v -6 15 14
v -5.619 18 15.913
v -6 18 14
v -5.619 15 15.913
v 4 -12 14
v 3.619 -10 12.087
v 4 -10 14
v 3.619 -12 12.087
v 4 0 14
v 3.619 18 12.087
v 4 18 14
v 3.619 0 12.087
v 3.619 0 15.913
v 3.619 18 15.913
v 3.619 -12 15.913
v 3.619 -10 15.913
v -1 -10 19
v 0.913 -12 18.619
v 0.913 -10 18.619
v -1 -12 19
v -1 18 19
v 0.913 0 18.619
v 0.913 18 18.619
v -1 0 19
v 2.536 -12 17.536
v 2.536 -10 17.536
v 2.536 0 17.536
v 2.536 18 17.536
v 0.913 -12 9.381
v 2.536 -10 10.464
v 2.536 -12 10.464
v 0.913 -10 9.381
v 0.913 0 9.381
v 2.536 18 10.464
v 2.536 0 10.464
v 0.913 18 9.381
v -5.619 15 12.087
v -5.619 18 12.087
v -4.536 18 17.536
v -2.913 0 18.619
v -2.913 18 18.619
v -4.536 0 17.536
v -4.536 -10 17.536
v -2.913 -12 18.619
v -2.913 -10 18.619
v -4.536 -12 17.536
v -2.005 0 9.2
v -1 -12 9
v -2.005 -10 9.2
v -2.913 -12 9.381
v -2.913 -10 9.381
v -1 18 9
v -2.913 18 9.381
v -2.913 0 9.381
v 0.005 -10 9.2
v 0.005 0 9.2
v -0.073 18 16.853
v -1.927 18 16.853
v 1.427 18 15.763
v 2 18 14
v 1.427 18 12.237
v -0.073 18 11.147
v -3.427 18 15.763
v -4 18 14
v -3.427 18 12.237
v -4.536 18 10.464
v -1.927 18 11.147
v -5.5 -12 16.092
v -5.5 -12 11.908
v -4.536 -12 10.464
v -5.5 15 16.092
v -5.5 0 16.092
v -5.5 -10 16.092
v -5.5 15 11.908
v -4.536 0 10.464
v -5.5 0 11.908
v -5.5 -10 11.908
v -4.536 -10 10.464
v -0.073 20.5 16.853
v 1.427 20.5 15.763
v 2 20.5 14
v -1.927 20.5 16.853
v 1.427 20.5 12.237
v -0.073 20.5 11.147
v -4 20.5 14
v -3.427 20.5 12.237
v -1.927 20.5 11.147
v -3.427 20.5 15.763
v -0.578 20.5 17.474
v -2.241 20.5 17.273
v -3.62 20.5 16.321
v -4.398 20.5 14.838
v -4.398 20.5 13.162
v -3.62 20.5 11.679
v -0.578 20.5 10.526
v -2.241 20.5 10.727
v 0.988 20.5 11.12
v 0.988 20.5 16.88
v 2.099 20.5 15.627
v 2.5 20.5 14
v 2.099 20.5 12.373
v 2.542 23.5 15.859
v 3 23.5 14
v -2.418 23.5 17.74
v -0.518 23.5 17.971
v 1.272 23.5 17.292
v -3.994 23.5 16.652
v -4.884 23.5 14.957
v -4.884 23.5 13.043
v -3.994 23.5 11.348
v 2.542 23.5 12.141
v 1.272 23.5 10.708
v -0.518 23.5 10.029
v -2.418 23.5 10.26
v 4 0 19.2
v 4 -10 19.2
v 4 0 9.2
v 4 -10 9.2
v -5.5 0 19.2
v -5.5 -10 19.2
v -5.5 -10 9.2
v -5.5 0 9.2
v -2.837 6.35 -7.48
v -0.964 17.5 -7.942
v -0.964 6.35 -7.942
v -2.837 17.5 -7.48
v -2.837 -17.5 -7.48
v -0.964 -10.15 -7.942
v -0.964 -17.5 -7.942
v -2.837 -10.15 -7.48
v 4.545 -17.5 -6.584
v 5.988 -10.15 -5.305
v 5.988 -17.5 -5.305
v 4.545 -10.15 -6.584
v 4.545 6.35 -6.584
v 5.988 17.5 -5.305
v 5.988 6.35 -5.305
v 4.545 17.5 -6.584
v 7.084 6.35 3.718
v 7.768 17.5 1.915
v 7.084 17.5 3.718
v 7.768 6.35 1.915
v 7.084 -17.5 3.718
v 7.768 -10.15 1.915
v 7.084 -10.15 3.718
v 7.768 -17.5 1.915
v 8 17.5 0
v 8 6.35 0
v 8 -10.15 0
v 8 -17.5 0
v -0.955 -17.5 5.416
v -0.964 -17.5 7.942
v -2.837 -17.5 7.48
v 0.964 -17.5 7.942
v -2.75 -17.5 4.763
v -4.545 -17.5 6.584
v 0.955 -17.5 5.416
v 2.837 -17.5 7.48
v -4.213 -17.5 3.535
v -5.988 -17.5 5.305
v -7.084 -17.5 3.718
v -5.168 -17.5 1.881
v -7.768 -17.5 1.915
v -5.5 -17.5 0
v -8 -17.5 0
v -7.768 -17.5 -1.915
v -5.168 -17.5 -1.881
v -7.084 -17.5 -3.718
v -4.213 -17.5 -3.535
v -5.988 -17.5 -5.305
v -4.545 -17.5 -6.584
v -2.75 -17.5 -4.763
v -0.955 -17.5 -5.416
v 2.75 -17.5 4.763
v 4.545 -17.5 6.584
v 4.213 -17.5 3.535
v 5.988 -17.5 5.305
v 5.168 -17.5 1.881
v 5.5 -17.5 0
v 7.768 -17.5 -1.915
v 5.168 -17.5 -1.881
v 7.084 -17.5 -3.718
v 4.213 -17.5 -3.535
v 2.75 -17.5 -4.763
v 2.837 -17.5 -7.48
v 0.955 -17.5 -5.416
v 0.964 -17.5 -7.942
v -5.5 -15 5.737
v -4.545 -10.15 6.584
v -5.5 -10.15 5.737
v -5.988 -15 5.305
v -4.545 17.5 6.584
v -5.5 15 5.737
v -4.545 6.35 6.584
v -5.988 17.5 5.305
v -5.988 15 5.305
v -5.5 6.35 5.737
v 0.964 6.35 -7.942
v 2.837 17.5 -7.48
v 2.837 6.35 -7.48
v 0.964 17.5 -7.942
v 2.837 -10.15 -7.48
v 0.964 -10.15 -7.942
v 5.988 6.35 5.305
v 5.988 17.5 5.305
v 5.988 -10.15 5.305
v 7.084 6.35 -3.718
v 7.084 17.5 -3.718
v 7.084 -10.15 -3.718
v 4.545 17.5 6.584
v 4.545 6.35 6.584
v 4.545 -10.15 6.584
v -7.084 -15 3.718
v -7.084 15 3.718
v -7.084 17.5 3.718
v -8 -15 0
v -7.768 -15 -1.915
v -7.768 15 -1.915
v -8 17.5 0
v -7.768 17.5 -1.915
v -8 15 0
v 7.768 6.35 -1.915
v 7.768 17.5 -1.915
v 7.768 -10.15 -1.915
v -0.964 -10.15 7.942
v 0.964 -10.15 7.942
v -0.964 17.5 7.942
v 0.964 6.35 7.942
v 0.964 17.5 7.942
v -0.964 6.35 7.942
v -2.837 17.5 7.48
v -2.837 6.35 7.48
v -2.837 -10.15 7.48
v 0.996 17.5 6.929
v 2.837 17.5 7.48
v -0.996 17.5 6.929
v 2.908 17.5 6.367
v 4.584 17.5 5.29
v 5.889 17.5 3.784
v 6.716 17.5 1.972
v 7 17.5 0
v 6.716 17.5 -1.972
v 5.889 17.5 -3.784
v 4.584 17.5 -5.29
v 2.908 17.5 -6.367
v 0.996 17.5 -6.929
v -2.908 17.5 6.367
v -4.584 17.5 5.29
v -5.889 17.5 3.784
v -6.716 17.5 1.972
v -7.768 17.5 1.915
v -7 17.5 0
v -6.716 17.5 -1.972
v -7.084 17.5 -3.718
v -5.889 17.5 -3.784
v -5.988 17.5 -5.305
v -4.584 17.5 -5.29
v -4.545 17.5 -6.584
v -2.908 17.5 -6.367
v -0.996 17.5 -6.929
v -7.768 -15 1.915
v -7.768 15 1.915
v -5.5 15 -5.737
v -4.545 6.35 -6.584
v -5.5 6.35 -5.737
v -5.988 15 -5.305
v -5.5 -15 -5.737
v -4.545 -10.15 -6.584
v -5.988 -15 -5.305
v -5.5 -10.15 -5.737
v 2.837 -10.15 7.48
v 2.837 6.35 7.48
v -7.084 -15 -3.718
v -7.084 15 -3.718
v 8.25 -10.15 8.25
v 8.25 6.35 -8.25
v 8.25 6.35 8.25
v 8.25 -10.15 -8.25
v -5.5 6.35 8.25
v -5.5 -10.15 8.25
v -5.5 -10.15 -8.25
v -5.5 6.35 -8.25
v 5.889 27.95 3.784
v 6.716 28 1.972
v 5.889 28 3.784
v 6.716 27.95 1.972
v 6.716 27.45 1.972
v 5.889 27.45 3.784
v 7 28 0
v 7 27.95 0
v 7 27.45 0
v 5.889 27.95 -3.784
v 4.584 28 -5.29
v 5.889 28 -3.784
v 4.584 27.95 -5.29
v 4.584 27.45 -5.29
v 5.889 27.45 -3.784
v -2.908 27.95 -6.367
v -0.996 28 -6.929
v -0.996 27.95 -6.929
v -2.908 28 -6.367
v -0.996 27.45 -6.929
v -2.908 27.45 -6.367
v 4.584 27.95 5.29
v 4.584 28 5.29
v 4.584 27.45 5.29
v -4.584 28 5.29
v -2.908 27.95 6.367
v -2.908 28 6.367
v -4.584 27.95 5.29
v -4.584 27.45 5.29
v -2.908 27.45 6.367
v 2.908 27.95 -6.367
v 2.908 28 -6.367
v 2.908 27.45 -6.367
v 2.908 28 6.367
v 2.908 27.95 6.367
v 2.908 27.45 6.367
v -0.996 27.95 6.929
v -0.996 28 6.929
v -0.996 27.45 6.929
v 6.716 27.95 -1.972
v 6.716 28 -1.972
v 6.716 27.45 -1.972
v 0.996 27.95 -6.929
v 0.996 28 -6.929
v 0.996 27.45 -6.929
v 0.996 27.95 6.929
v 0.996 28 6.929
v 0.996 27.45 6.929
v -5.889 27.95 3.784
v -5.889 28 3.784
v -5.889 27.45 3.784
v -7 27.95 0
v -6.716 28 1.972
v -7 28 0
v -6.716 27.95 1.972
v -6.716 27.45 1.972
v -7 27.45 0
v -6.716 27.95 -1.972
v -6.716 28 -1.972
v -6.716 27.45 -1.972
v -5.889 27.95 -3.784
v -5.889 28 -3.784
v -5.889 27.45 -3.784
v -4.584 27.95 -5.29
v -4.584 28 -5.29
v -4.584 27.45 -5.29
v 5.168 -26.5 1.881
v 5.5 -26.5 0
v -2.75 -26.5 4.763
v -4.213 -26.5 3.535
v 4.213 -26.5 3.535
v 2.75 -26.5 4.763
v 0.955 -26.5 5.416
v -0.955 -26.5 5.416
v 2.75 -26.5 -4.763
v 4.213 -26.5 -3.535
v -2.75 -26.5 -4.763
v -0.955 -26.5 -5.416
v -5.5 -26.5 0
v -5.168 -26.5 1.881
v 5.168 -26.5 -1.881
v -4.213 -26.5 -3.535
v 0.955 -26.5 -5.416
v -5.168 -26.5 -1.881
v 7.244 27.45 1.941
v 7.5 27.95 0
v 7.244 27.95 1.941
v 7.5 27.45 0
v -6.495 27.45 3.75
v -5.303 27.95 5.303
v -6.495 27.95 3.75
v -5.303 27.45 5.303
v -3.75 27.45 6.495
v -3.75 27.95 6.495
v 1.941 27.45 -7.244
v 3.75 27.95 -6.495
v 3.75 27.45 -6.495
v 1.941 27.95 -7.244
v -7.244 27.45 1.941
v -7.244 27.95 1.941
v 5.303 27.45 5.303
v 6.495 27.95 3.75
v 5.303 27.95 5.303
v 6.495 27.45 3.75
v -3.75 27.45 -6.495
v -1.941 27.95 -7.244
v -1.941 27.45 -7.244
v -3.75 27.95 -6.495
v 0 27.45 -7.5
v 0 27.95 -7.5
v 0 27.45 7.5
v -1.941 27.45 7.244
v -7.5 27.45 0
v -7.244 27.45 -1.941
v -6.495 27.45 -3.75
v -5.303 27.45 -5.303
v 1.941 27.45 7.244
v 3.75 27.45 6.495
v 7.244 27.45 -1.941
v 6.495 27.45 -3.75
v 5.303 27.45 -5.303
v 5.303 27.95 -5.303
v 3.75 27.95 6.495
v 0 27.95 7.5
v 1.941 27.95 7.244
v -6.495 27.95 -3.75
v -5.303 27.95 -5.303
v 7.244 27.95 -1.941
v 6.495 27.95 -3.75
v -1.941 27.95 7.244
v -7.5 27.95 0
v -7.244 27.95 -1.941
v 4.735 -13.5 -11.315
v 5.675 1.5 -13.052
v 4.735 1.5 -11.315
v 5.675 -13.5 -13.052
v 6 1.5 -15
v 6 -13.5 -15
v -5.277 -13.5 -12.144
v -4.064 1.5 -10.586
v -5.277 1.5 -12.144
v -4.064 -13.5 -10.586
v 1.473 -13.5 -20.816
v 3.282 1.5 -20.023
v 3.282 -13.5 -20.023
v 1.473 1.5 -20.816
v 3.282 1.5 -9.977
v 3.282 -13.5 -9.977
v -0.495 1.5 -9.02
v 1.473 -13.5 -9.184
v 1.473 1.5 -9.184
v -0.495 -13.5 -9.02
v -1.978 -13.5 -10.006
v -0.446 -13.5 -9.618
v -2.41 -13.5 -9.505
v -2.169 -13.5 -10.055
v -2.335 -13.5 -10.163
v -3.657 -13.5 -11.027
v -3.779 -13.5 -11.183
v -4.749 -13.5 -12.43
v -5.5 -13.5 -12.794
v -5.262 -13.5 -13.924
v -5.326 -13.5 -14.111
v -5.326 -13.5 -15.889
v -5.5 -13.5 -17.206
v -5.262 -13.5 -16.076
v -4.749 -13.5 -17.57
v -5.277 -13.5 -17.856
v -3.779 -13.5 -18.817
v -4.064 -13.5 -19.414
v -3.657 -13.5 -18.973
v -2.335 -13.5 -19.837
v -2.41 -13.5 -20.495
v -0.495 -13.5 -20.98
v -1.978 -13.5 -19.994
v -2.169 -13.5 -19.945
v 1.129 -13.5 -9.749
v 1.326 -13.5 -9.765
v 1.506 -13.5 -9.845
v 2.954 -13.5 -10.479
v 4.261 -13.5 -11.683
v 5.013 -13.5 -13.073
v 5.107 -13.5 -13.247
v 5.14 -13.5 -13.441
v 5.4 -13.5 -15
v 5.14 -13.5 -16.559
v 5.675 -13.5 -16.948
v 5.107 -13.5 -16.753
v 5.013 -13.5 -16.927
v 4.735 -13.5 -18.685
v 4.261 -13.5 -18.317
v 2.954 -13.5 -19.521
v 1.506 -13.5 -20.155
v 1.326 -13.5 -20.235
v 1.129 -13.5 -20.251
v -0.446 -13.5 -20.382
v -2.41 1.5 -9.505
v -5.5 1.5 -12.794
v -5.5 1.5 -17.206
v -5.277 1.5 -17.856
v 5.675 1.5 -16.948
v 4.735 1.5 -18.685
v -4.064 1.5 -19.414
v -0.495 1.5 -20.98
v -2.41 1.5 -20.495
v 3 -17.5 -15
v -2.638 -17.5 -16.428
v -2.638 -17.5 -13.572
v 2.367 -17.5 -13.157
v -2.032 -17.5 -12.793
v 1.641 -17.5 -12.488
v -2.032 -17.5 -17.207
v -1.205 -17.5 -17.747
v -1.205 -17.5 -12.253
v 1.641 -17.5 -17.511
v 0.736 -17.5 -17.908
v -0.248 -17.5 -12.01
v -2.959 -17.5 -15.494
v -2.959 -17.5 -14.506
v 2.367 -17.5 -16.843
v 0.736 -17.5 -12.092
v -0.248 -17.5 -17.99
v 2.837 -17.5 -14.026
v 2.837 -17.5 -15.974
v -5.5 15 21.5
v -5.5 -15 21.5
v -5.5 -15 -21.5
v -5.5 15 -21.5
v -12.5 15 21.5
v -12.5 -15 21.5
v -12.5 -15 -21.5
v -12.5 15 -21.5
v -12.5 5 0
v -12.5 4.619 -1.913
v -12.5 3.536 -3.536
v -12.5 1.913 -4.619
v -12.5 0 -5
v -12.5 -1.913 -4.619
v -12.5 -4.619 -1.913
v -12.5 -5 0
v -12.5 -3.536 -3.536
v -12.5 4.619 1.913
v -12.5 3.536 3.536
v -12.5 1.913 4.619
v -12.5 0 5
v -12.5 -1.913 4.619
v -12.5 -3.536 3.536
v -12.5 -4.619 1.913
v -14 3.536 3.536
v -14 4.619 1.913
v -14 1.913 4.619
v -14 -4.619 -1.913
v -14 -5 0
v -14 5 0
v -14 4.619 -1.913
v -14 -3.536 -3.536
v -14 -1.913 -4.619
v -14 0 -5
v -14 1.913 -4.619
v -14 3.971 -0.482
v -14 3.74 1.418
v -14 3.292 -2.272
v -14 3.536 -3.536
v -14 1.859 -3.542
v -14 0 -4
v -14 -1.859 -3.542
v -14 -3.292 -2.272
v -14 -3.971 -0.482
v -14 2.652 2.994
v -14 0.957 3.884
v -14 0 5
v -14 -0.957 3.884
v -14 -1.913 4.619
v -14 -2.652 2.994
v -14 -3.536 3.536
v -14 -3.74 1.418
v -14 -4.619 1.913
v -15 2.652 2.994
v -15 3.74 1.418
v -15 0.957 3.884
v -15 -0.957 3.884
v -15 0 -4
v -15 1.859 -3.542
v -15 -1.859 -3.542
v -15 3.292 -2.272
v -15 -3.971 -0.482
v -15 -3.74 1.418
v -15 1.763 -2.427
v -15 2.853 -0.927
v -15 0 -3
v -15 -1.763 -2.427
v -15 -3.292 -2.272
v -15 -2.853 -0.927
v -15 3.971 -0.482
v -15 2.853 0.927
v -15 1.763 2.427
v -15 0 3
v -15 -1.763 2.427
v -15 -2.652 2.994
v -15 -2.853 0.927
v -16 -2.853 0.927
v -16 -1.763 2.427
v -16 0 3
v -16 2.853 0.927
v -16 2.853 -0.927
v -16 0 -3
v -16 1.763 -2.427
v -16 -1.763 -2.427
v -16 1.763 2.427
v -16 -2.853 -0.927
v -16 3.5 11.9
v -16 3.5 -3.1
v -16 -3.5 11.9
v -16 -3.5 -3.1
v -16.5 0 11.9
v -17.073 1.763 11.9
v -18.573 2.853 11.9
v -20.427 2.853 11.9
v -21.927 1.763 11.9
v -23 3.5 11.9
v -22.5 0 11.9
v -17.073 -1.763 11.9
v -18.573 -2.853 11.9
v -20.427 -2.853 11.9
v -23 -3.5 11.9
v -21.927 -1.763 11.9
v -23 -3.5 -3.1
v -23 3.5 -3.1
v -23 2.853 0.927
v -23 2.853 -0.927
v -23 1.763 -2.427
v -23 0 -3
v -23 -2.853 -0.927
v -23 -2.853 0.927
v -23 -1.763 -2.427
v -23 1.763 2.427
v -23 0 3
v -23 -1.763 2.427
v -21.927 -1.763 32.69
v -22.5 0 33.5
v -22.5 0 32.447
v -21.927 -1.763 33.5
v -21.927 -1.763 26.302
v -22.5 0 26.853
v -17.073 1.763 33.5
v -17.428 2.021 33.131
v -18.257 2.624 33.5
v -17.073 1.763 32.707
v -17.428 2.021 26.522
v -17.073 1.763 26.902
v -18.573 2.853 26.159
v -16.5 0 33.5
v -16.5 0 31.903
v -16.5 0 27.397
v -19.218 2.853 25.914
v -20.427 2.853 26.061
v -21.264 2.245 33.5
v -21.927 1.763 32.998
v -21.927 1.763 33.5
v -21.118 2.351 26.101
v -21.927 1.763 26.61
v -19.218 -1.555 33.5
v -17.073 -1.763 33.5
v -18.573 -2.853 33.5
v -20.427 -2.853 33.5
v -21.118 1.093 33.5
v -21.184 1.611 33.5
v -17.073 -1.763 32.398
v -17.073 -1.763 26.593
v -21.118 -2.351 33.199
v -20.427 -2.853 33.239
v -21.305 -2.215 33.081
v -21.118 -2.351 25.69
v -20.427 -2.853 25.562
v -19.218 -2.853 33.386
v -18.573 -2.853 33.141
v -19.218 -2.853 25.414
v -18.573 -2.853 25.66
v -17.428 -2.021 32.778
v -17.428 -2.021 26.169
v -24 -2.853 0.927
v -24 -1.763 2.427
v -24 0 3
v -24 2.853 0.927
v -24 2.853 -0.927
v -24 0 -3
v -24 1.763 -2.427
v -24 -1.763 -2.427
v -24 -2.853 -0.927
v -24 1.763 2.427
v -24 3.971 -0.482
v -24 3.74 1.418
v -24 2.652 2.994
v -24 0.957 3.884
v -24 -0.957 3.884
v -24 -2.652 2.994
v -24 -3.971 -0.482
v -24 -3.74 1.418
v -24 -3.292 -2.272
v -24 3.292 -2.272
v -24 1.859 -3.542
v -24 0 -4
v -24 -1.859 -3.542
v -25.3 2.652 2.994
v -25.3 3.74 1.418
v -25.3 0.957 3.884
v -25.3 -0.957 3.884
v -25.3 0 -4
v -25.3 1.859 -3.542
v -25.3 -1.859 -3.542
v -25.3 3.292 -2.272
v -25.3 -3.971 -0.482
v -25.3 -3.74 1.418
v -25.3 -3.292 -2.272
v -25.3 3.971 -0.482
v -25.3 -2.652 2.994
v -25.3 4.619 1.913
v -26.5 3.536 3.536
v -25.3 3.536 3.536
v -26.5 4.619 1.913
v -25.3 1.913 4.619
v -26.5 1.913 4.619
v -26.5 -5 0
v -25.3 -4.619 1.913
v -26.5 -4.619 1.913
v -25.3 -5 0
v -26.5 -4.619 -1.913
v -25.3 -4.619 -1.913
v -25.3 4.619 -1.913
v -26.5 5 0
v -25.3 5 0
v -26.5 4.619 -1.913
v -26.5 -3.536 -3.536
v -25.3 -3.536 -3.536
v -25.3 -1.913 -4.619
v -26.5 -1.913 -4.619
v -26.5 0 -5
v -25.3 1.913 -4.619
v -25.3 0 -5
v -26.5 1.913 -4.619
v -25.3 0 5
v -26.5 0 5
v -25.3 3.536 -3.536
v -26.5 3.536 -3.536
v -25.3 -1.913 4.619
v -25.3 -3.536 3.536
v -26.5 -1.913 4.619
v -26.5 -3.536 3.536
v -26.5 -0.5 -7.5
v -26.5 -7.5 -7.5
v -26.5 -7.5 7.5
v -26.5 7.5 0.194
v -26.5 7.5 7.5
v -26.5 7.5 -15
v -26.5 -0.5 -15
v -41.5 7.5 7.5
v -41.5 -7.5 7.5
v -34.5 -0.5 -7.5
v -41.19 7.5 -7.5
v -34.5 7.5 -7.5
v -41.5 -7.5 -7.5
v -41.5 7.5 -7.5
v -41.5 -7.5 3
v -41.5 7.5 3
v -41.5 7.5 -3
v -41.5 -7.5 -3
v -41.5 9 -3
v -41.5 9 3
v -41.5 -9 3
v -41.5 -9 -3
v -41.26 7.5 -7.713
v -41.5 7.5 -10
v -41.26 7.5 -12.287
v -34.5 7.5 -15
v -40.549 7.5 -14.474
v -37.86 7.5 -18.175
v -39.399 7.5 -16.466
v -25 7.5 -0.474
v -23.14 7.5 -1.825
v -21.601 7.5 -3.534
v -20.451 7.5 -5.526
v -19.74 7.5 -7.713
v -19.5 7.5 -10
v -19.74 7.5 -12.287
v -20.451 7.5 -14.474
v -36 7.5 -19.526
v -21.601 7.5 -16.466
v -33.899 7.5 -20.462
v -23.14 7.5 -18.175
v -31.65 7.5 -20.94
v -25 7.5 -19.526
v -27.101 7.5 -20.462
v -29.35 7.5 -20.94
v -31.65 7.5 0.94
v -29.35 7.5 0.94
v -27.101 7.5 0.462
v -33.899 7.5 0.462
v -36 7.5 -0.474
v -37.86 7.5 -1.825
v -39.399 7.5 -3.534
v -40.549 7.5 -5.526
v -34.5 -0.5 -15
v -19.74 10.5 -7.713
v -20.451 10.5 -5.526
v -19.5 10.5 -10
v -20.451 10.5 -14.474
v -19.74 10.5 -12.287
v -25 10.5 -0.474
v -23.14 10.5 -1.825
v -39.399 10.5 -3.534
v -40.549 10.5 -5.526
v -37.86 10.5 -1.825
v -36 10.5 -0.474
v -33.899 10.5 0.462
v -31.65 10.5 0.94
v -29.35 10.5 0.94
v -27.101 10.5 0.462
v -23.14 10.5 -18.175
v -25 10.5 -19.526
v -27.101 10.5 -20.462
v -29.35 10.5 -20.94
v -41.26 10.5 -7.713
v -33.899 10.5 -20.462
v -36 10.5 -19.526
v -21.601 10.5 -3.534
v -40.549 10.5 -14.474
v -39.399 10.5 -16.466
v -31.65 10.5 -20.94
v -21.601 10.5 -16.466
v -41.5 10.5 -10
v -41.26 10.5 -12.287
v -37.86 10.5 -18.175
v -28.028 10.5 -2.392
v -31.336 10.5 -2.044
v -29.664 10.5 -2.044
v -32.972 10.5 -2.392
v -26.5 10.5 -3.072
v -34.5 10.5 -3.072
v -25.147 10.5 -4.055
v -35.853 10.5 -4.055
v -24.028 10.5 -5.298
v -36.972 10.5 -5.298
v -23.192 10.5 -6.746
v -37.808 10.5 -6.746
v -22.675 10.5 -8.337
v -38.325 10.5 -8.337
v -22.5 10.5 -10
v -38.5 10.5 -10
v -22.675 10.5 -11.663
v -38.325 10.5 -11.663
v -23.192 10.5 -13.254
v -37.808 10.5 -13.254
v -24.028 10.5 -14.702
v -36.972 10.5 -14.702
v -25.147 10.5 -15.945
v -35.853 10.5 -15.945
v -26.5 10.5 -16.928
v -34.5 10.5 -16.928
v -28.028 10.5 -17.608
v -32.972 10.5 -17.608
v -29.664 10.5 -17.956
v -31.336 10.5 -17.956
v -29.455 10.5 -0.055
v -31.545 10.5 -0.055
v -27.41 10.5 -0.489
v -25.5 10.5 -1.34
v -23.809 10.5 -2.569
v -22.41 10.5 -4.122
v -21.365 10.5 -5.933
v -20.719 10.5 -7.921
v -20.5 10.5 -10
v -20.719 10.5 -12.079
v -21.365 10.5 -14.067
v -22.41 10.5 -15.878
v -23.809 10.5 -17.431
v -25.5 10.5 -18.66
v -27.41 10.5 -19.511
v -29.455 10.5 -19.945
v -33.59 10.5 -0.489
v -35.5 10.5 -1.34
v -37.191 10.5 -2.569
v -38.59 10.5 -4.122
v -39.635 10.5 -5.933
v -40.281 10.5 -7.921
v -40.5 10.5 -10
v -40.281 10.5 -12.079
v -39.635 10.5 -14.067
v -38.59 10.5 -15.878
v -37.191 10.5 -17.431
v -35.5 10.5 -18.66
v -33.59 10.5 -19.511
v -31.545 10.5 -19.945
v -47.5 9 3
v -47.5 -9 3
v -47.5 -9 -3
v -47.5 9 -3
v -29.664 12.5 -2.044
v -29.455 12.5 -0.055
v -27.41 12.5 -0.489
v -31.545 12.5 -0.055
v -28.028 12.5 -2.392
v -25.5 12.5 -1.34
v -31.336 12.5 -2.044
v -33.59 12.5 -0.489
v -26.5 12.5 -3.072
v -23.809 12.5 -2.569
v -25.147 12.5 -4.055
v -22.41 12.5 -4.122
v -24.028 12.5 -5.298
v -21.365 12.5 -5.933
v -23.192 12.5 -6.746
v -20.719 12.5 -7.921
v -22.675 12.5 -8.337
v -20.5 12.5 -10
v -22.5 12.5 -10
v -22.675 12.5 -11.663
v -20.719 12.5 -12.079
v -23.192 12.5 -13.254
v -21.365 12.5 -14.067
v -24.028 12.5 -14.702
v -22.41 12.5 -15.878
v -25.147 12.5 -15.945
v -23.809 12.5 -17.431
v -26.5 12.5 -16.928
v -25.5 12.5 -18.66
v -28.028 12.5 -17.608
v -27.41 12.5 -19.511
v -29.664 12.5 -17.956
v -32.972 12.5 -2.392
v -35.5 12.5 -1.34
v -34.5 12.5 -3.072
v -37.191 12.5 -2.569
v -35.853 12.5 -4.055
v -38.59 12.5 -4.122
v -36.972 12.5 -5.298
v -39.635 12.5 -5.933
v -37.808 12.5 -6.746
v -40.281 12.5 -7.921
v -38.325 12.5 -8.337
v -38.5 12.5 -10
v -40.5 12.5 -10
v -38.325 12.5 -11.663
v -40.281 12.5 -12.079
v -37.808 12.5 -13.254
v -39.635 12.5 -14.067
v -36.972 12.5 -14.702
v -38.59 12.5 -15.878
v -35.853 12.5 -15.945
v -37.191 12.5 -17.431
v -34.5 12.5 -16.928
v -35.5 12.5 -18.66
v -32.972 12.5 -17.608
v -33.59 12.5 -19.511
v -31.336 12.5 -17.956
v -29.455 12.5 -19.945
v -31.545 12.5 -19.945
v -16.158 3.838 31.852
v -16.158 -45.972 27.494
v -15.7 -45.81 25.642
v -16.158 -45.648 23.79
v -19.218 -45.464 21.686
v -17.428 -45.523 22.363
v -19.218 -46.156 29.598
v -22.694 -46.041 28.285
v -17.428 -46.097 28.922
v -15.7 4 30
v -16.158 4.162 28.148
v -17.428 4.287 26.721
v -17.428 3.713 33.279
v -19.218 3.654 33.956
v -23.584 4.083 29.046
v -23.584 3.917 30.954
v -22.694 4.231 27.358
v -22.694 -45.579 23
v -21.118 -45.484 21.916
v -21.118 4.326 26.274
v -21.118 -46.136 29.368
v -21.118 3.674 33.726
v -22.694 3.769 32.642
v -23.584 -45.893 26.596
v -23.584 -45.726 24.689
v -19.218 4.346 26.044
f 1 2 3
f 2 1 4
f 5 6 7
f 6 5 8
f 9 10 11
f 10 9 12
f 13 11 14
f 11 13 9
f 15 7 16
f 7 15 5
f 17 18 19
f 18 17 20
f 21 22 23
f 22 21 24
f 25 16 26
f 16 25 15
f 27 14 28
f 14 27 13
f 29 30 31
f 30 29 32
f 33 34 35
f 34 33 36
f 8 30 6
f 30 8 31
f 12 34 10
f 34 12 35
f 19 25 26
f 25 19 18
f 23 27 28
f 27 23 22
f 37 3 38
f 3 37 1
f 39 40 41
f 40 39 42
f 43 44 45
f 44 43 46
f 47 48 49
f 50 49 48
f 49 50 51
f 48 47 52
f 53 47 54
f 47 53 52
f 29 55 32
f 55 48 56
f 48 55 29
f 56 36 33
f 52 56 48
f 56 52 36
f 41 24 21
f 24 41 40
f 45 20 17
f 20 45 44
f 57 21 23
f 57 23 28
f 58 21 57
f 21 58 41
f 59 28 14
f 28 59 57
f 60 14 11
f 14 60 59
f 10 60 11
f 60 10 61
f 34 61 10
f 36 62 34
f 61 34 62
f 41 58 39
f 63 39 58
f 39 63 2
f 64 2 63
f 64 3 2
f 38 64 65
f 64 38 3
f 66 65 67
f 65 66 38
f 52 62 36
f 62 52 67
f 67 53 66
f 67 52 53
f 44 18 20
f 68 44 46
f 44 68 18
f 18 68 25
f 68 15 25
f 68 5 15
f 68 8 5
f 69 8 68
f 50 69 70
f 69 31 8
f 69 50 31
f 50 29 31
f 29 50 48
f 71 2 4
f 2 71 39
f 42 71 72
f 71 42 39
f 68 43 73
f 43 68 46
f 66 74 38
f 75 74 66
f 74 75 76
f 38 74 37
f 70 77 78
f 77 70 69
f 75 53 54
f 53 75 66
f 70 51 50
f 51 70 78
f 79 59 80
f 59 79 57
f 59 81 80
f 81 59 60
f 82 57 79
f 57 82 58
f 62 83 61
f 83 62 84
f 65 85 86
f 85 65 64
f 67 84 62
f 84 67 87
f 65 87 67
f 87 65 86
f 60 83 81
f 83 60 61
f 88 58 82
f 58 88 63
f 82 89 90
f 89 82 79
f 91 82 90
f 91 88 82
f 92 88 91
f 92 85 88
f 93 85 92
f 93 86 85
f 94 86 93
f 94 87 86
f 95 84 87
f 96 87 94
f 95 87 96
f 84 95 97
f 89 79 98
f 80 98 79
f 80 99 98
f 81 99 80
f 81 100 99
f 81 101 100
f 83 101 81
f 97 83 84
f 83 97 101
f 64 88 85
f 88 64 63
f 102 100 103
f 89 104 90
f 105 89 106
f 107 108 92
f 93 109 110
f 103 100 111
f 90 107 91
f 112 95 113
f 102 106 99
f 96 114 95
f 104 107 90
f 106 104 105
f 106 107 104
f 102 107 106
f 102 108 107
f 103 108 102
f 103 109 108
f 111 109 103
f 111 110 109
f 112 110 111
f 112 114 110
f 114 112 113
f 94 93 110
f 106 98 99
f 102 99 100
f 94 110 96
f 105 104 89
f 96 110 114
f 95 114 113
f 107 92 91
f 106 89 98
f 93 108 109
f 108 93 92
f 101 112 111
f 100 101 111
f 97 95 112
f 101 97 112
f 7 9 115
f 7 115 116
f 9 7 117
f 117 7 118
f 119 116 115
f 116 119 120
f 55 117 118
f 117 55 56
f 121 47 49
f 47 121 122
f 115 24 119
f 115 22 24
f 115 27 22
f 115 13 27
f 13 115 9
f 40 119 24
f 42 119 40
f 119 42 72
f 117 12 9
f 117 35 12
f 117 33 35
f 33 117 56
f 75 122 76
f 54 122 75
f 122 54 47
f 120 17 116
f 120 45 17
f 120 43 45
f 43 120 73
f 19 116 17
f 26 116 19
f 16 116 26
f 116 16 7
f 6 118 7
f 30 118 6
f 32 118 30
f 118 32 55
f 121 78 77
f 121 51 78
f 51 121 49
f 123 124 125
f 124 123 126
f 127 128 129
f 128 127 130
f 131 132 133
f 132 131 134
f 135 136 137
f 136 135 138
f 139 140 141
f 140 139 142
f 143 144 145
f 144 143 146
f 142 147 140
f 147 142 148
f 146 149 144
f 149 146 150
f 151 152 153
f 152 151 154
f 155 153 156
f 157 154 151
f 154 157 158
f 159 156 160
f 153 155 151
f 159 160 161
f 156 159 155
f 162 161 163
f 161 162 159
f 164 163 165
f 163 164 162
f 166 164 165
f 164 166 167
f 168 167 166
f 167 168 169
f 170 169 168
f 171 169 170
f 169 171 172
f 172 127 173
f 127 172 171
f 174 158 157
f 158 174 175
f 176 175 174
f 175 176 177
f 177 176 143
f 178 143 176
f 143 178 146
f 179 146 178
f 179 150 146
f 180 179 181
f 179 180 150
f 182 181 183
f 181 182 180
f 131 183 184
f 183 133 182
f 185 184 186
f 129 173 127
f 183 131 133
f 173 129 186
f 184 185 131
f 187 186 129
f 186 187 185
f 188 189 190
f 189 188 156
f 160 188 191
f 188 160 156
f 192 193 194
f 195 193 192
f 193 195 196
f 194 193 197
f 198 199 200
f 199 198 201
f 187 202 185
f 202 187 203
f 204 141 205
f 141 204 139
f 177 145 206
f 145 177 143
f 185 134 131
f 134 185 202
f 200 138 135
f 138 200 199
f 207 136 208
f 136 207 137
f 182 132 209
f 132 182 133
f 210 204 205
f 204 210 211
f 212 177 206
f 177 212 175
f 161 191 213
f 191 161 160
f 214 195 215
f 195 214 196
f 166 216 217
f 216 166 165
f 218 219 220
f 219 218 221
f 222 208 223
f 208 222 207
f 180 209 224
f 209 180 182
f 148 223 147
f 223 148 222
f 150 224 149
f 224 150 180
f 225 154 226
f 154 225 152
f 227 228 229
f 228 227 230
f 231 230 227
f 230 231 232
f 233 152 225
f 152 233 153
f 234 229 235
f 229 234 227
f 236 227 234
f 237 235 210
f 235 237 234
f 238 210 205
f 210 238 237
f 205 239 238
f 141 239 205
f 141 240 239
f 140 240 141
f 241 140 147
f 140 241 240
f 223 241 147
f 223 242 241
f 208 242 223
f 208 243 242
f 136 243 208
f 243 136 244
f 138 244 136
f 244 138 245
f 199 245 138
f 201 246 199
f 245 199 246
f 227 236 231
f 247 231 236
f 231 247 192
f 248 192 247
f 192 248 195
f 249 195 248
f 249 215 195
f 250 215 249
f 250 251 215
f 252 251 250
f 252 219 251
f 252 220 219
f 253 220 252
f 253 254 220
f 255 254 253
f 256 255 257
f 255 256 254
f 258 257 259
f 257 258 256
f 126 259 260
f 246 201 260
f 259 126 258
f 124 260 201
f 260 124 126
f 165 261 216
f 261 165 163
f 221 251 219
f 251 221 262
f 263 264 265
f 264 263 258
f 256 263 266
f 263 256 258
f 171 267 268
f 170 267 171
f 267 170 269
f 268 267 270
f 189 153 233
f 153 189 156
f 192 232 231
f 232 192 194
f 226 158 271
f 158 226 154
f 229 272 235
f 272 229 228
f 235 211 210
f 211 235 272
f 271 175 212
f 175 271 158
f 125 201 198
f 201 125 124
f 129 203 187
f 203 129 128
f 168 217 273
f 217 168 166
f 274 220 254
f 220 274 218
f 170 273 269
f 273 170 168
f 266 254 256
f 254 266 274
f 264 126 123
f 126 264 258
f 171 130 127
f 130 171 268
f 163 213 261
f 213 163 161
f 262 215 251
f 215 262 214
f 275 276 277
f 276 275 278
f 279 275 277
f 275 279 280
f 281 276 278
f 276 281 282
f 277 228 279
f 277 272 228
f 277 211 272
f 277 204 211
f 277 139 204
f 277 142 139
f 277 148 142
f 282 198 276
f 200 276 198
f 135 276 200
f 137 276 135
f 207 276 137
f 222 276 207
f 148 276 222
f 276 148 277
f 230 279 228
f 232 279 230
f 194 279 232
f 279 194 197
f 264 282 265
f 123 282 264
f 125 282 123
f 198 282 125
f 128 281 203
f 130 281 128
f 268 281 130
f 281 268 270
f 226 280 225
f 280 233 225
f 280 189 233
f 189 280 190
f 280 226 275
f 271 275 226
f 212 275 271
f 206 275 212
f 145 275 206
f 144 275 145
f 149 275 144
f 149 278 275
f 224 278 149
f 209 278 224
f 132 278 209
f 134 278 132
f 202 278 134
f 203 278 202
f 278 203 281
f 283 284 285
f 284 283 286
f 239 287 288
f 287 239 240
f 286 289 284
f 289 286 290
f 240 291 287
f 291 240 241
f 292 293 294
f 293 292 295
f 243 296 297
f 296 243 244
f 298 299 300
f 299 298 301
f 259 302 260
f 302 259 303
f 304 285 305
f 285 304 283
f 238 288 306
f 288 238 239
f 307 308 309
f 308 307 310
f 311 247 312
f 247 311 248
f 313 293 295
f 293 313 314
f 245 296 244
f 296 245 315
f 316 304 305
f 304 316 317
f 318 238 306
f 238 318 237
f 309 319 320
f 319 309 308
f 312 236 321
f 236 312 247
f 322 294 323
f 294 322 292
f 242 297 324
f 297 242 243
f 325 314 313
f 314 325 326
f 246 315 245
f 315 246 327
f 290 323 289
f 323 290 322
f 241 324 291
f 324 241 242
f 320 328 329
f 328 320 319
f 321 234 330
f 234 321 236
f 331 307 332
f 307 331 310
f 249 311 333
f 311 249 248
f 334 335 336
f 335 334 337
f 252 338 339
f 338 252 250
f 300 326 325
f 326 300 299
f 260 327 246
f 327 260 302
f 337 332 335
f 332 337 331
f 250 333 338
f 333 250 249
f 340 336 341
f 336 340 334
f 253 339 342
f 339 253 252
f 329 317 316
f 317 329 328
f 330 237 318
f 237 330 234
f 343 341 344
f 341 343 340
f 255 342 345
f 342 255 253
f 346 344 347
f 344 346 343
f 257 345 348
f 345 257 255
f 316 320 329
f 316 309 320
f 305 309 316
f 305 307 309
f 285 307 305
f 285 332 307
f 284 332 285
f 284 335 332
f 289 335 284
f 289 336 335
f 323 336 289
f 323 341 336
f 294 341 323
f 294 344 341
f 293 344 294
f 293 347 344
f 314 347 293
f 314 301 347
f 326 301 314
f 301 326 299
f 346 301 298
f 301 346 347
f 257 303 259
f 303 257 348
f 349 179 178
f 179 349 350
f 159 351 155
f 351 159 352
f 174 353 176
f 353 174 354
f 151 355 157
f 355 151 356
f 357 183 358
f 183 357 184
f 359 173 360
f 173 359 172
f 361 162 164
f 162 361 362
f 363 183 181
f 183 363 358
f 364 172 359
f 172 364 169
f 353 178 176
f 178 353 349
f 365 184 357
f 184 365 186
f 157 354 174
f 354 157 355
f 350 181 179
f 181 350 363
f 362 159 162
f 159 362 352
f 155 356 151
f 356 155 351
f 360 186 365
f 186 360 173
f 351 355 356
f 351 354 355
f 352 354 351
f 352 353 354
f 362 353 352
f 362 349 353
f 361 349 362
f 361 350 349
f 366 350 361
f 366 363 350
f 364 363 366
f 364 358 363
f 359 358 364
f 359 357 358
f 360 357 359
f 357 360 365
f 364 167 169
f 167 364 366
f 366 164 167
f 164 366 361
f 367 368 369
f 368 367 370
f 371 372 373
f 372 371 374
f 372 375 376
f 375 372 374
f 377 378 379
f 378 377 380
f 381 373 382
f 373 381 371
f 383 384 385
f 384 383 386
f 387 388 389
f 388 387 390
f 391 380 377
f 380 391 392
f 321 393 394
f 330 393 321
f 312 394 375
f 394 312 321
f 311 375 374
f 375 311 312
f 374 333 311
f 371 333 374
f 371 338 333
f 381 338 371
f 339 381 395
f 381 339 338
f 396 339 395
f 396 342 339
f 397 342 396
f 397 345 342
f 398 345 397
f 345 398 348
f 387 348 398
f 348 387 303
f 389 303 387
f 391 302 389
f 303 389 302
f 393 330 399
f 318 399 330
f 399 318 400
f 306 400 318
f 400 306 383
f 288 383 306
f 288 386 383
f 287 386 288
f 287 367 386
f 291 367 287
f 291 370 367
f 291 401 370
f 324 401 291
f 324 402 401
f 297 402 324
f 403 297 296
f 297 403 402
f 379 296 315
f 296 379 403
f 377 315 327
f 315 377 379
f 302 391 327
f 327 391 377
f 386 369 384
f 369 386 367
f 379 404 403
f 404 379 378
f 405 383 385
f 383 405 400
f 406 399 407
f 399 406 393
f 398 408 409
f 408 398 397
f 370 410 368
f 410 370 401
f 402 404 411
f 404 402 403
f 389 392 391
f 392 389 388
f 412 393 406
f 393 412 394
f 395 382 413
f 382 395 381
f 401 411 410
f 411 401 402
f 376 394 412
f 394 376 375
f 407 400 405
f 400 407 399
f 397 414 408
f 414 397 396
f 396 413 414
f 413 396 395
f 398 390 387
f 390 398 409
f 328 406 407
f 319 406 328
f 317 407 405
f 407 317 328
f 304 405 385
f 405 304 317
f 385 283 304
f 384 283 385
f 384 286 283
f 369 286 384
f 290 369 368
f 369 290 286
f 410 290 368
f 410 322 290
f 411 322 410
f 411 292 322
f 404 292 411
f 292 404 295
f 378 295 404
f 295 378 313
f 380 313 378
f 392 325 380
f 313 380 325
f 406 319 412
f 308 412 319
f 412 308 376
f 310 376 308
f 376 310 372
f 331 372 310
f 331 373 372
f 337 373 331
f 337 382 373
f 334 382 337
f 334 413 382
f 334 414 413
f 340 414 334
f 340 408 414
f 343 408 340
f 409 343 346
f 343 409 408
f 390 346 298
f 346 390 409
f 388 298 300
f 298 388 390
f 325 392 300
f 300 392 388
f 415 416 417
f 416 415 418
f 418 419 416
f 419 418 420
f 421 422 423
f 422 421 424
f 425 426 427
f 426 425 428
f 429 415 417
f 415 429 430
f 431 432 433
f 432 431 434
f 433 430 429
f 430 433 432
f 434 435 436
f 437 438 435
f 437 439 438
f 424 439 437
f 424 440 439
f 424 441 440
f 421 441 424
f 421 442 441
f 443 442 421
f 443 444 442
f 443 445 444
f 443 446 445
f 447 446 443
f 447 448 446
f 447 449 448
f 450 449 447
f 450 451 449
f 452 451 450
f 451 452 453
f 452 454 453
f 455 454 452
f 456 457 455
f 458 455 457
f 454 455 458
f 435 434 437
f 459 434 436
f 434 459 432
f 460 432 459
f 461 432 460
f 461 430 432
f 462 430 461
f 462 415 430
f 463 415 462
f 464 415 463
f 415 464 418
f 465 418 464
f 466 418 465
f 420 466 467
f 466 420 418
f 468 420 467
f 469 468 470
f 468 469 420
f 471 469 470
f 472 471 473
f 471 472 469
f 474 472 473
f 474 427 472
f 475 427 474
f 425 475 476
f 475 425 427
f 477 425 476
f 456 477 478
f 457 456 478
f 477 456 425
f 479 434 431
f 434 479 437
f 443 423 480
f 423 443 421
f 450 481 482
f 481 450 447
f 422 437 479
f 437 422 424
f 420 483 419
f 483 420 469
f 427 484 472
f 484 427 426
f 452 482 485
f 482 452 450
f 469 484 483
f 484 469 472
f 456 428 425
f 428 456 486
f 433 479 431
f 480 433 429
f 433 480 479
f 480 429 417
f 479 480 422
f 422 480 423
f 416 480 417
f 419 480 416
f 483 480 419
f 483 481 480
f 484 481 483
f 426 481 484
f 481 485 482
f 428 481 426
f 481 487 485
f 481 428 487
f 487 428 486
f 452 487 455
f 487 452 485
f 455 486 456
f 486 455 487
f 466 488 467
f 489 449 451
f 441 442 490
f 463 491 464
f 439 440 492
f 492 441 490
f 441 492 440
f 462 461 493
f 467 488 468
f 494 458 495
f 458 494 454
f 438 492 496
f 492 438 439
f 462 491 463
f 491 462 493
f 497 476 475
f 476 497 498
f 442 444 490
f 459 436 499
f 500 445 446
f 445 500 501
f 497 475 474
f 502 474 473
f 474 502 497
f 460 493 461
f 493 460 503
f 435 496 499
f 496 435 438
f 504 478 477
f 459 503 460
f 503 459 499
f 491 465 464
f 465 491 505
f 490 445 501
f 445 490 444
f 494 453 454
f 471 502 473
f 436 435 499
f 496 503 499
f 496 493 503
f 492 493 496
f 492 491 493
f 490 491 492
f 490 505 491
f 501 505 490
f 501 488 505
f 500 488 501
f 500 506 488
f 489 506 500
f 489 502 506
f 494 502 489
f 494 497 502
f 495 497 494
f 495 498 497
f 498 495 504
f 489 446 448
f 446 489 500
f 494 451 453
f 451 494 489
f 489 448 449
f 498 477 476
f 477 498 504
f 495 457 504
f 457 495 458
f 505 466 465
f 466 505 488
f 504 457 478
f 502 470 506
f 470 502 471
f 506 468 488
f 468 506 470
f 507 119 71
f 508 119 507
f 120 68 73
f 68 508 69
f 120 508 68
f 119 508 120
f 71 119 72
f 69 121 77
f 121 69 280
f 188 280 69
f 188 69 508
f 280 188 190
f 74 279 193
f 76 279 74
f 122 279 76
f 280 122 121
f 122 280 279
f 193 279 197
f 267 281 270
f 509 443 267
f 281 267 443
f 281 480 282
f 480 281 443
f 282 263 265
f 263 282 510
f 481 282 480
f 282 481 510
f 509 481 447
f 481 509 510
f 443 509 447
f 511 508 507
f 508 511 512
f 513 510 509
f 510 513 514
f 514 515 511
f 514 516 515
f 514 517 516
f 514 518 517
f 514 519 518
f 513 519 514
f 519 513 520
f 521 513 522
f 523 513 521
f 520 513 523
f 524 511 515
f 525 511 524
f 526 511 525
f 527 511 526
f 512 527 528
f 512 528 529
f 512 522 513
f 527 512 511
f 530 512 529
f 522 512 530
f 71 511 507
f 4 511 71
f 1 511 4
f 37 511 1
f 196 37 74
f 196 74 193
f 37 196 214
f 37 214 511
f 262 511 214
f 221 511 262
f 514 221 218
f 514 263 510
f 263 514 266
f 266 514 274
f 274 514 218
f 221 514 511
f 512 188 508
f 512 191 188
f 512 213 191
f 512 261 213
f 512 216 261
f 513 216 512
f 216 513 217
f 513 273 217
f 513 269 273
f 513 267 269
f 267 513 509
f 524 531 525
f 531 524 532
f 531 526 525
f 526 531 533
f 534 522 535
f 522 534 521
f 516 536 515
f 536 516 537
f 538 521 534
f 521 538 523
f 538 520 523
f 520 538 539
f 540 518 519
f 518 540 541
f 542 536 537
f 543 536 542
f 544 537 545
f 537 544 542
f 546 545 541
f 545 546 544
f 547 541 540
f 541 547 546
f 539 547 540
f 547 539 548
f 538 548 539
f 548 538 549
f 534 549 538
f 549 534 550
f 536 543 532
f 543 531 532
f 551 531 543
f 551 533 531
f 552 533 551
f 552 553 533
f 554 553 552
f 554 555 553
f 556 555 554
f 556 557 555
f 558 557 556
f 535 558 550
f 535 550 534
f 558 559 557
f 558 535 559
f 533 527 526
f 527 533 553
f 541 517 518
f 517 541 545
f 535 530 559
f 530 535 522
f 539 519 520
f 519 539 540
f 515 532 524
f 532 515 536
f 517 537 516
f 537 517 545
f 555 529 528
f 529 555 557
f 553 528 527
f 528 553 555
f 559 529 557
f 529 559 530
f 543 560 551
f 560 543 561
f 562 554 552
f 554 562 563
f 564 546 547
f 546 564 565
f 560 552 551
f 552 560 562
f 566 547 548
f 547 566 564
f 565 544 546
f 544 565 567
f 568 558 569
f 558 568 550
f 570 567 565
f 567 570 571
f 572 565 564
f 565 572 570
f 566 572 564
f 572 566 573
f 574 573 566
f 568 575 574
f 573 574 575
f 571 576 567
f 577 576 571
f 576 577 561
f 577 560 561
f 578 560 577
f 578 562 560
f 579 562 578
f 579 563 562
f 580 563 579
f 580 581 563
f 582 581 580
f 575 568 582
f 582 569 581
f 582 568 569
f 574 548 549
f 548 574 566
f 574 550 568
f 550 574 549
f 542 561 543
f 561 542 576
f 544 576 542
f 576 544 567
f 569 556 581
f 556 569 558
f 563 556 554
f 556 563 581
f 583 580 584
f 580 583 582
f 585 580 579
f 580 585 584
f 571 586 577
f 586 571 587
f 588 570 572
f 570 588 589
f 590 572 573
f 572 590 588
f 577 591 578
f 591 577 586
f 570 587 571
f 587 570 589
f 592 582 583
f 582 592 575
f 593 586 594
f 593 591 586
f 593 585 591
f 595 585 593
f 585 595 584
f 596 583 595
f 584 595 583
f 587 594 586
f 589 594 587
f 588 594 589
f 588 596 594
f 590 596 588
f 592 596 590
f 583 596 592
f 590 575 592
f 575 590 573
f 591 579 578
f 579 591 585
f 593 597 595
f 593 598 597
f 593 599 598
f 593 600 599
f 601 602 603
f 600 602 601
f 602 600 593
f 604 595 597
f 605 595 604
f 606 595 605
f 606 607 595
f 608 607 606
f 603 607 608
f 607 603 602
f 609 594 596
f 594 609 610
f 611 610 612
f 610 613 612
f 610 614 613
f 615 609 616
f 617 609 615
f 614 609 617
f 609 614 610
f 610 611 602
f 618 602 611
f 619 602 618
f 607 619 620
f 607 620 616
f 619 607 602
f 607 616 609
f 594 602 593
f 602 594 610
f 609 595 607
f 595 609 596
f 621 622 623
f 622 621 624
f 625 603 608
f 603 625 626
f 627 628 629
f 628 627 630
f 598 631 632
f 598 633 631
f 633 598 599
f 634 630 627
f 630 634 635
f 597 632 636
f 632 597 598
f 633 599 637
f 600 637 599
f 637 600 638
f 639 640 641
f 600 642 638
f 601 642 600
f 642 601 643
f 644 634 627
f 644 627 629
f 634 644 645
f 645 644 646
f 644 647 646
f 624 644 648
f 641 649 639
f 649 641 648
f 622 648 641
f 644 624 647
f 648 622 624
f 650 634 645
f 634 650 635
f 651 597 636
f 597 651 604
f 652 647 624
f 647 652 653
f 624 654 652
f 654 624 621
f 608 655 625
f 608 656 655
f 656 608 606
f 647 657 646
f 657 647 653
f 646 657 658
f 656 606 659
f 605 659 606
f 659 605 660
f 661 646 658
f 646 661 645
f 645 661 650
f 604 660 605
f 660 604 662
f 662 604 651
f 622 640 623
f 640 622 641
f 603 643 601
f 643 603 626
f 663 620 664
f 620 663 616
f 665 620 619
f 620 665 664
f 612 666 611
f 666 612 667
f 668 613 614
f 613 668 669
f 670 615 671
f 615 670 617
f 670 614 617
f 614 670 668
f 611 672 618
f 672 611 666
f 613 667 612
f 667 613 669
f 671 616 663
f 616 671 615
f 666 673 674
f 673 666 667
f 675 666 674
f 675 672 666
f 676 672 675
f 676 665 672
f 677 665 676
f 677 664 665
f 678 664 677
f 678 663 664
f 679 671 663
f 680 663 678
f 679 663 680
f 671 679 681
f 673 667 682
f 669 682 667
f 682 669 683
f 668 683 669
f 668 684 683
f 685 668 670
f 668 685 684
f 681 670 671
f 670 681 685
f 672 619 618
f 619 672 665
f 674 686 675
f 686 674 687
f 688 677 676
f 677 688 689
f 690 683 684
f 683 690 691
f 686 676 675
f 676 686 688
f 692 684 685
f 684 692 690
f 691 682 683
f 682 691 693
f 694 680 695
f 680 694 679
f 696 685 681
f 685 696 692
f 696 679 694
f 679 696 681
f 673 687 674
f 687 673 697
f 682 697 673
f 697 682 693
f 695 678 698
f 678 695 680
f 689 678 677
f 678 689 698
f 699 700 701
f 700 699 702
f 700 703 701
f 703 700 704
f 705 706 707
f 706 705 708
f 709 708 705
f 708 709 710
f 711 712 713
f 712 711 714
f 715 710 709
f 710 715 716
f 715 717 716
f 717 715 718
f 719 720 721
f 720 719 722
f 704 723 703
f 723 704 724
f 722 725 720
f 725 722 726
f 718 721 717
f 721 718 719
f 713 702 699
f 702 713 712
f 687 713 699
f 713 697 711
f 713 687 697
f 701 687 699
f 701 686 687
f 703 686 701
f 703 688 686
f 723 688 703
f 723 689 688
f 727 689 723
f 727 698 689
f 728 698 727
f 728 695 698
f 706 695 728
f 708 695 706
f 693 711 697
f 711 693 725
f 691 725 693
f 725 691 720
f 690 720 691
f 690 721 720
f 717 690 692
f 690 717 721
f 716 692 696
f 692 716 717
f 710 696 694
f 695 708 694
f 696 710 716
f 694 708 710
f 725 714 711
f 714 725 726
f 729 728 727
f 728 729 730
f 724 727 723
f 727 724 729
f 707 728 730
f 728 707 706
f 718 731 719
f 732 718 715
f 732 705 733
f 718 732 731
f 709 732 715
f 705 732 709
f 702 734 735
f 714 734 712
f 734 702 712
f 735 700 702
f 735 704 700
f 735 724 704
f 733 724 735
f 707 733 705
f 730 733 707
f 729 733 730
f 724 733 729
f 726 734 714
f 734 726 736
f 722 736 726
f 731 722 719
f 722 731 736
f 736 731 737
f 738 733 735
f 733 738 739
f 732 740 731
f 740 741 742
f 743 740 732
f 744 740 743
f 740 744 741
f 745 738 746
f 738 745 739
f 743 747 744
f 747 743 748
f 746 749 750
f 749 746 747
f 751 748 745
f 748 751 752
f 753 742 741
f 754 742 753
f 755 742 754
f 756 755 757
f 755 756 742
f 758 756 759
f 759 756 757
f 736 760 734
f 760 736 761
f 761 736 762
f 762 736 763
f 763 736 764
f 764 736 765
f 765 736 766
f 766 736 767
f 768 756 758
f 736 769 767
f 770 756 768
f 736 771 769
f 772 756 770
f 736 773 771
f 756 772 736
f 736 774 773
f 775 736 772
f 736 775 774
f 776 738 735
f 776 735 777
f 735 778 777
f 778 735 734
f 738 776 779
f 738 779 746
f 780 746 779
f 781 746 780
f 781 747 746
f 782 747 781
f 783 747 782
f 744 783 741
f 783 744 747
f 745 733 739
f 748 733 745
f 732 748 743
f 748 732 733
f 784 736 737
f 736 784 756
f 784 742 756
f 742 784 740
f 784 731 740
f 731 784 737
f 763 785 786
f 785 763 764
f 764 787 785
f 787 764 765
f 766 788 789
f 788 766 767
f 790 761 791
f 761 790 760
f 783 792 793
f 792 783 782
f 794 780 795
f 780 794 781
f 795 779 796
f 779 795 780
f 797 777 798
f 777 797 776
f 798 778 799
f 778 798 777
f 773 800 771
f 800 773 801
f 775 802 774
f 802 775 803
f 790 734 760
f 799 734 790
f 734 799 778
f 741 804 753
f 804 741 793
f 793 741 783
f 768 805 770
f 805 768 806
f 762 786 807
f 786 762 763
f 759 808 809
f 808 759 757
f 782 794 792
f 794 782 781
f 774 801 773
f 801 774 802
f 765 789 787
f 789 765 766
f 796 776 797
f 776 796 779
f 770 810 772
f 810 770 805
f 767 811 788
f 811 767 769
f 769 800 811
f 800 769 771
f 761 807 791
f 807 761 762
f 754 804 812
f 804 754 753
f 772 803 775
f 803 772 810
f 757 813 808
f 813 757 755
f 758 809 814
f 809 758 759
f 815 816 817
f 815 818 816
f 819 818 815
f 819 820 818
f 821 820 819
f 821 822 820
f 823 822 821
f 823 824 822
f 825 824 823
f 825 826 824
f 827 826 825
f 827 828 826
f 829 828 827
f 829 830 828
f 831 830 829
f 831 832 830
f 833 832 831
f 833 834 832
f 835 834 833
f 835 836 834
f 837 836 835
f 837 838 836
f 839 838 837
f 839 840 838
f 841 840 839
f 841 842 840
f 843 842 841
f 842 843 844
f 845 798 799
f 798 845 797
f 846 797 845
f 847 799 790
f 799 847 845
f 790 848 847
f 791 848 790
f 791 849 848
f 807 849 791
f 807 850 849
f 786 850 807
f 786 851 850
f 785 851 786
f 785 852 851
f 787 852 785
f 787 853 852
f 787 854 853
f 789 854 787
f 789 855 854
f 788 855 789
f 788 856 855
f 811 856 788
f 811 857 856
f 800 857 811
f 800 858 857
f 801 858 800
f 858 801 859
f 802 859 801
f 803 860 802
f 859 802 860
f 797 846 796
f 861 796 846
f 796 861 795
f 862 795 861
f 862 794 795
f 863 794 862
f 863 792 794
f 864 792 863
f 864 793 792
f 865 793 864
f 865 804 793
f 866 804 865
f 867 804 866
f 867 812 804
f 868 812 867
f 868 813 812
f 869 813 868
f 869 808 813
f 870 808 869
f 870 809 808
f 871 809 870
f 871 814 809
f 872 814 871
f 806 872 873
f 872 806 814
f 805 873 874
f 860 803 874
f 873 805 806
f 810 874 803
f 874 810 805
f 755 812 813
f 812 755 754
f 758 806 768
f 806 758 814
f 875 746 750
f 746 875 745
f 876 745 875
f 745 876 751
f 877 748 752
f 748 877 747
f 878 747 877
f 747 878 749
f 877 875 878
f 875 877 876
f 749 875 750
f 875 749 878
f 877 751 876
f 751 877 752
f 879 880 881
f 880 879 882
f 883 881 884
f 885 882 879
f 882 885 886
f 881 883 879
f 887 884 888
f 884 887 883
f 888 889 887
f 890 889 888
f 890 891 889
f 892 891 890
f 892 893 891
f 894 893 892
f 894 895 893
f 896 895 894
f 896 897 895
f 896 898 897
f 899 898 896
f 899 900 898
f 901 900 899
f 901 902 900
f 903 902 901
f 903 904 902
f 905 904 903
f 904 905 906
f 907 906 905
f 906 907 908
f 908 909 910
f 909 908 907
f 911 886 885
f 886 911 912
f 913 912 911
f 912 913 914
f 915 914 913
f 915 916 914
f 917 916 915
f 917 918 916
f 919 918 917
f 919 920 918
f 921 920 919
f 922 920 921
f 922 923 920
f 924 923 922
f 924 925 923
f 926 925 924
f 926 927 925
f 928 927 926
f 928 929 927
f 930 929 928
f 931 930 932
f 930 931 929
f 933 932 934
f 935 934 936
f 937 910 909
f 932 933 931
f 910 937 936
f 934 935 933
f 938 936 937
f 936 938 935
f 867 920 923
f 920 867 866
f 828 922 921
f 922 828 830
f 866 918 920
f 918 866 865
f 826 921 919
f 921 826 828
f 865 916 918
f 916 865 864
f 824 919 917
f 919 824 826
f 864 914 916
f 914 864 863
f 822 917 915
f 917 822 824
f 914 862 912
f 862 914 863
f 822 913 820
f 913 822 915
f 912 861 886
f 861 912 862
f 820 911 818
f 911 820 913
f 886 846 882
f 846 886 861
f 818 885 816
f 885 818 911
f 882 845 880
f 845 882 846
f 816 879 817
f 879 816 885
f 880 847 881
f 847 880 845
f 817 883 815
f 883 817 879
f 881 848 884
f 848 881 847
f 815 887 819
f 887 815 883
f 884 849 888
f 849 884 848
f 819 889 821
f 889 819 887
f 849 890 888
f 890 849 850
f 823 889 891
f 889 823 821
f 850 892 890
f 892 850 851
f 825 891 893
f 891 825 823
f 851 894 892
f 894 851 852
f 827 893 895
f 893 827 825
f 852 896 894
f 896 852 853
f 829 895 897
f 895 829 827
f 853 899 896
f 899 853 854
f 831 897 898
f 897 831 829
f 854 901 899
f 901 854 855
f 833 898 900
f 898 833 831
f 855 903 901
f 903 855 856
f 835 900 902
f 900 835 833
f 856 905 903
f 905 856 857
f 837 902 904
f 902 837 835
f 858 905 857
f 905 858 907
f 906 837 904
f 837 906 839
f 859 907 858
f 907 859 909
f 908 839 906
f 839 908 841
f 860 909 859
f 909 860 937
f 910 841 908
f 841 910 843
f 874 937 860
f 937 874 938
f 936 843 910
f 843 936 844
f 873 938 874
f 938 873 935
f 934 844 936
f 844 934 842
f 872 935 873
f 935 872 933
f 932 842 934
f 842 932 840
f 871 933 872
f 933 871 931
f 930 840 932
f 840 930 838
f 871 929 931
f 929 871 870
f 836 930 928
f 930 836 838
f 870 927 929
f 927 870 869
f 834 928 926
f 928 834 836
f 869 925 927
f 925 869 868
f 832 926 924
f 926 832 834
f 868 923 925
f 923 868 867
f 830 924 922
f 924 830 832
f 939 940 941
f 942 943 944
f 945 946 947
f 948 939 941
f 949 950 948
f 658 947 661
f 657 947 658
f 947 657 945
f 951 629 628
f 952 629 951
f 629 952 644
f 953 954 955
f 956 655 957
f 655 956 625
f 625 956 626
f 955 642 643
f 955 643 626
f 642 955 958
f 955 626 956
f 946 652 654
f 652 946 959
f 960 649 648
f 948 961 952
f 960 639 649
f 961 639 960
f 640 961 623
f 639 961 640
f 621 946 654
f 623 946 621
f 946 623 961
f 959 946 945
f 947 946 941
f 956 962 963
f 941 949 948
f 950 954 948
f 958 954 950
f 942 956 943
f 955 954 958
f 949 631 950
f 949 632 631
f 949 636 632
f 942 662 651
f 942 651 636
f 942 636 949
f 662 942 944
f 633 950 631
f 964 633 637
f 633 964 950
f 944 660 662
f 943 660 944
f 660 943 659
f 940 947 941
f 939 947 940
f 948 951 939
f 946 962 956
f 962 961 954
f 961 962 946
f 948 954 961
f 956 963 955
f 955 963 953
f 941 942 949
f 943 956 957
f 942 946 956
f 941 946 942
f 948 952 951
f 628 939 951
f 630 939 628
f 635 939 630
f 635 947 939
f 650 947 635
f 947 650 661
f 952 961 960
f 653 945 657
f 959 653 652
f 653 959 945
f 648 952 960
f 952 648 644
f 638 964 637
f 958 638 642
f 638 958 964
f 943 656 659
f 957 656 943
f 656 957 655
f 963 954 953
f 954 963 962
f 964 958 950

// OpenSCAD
module Imaging_Science_Subsystem(posx = 0, posy = 0, posz = 0){
    translate([posx, posy, posz]) {
    
    cilindroAltura = 35;
    cilindroDiametro = 8;

    //cilindro superior
    translate([-1,3,14]) rotate([90,0,0])
    cylinder(cilindroAltura - 5,cilindroDiametro - 3,cilindroDiametro - 3, center = true);

    translate([-1,18,14]) rotate([90,0,0])
    cylinder(cilindroAltura - 30,cilindroDiametro - 5,cilindroDiametro - 5, center = true);

    translate([-1,22,14]) rotate([90,0,0])
    cylinder(cilindroAltura - 32,cilindroDiametro - 4,cilindroDiametro - 4.5, center = true);

    translate([-6,-10,9.2])cube([10,10,10]);

    //cilindro maior
    rotate([90,0,0])
    cylinder(cilindroAltura,cilindroDiametro,cilindroDiametro, center = true);

    translate([0,-1.9,0])cube(16.5, center = true);

    //partes internas
    translate([0,13,0]) rotate([90,0,0])
    cylinder(cilindroAltura - 5,cilindroDiametro - 1,cilindroDiametro - 1, center = true);

    translate([0,-10,0]) rotate([90,0,0])
    cylinder(cilindroAltura - 2,cilindroDiametro - 2.5,cilindroDiametro - 2.5, center = true);

    translate([0,27.7,0]) rotate([90,0,0])
    cylinder(cilindroAltura - 34.5,cilindroDiametro-.5,cilindroDiametro-.5, center = true);

    //cilindro inferior
    translate([0,-6,-15]) rotate([90,0,0])
    cylinder(cilindroAltura - 20,cilindroDiametro - 2,cilindroDiametro - 2, center = true);
    
    translate([0,-15,-15]) rotate([90,0,0])
    cylinder(cilindroAltura - 30,cilindroDiametro - 2,cilindroDiametro - 5, center = true);

    // retangulo
    translate([-9,0,0])cube([7,30,43], center = true);
    }
    
    //juncao base
    module juncao(x,y,z,circunferencia){translate([x,y,z]) rotate([0,90,0]) cylinder(1.5,circunferencia,circunferencia);}
    
    juncao(-14,0,0,5);
    juncao(-15,0,0,4);
    juncao(-16,0,0,3);
    
    //peca entre juncoes
    translate([-19.5,0,4.4])cube([7,7,15], center = true);
    translate([-19.5,0,22])cylinder(23,3,3, center = true);
    
    juncao(-24,0,0,3);
    juncao(-25.5,0,0,4);
    juncao(-26.8,0,0,5);
    
    //peca da direita (ultraviolet spectrometer)
    translate([-34,0,0])cube(15, center = true);
    translate([-30.5,3.5,-11])cube(8, center = true);
    
    // cilindro direito
    translate([-30.5,9,-10]) rotate([90,0,0]) cylinder(3,11,11, center = true);
    
    translate([-44.5,0,0])cube([6,18,6], center = true);
    
    variavel = 8;

    module rolamento(){
        translate([-30.5,12.5,-10]) rotate([90,0,0])       rotate_extrude(angle=360){
            translate([variavel,0,0])
            square(2);
        }
    }
    rolamento();
    
    module haste_ligamento(posx = 0, posy = 0, posz = 0) {
    translate([posx, posy, posz]) {
        translate([-19.7,4,30])
        rotate([95,0,0])
        cylinder(h = 50, r = 4);
        }
    }
    haste_ligamento();
    
}

Imaging_Science_Subsystem(0,0,0);
